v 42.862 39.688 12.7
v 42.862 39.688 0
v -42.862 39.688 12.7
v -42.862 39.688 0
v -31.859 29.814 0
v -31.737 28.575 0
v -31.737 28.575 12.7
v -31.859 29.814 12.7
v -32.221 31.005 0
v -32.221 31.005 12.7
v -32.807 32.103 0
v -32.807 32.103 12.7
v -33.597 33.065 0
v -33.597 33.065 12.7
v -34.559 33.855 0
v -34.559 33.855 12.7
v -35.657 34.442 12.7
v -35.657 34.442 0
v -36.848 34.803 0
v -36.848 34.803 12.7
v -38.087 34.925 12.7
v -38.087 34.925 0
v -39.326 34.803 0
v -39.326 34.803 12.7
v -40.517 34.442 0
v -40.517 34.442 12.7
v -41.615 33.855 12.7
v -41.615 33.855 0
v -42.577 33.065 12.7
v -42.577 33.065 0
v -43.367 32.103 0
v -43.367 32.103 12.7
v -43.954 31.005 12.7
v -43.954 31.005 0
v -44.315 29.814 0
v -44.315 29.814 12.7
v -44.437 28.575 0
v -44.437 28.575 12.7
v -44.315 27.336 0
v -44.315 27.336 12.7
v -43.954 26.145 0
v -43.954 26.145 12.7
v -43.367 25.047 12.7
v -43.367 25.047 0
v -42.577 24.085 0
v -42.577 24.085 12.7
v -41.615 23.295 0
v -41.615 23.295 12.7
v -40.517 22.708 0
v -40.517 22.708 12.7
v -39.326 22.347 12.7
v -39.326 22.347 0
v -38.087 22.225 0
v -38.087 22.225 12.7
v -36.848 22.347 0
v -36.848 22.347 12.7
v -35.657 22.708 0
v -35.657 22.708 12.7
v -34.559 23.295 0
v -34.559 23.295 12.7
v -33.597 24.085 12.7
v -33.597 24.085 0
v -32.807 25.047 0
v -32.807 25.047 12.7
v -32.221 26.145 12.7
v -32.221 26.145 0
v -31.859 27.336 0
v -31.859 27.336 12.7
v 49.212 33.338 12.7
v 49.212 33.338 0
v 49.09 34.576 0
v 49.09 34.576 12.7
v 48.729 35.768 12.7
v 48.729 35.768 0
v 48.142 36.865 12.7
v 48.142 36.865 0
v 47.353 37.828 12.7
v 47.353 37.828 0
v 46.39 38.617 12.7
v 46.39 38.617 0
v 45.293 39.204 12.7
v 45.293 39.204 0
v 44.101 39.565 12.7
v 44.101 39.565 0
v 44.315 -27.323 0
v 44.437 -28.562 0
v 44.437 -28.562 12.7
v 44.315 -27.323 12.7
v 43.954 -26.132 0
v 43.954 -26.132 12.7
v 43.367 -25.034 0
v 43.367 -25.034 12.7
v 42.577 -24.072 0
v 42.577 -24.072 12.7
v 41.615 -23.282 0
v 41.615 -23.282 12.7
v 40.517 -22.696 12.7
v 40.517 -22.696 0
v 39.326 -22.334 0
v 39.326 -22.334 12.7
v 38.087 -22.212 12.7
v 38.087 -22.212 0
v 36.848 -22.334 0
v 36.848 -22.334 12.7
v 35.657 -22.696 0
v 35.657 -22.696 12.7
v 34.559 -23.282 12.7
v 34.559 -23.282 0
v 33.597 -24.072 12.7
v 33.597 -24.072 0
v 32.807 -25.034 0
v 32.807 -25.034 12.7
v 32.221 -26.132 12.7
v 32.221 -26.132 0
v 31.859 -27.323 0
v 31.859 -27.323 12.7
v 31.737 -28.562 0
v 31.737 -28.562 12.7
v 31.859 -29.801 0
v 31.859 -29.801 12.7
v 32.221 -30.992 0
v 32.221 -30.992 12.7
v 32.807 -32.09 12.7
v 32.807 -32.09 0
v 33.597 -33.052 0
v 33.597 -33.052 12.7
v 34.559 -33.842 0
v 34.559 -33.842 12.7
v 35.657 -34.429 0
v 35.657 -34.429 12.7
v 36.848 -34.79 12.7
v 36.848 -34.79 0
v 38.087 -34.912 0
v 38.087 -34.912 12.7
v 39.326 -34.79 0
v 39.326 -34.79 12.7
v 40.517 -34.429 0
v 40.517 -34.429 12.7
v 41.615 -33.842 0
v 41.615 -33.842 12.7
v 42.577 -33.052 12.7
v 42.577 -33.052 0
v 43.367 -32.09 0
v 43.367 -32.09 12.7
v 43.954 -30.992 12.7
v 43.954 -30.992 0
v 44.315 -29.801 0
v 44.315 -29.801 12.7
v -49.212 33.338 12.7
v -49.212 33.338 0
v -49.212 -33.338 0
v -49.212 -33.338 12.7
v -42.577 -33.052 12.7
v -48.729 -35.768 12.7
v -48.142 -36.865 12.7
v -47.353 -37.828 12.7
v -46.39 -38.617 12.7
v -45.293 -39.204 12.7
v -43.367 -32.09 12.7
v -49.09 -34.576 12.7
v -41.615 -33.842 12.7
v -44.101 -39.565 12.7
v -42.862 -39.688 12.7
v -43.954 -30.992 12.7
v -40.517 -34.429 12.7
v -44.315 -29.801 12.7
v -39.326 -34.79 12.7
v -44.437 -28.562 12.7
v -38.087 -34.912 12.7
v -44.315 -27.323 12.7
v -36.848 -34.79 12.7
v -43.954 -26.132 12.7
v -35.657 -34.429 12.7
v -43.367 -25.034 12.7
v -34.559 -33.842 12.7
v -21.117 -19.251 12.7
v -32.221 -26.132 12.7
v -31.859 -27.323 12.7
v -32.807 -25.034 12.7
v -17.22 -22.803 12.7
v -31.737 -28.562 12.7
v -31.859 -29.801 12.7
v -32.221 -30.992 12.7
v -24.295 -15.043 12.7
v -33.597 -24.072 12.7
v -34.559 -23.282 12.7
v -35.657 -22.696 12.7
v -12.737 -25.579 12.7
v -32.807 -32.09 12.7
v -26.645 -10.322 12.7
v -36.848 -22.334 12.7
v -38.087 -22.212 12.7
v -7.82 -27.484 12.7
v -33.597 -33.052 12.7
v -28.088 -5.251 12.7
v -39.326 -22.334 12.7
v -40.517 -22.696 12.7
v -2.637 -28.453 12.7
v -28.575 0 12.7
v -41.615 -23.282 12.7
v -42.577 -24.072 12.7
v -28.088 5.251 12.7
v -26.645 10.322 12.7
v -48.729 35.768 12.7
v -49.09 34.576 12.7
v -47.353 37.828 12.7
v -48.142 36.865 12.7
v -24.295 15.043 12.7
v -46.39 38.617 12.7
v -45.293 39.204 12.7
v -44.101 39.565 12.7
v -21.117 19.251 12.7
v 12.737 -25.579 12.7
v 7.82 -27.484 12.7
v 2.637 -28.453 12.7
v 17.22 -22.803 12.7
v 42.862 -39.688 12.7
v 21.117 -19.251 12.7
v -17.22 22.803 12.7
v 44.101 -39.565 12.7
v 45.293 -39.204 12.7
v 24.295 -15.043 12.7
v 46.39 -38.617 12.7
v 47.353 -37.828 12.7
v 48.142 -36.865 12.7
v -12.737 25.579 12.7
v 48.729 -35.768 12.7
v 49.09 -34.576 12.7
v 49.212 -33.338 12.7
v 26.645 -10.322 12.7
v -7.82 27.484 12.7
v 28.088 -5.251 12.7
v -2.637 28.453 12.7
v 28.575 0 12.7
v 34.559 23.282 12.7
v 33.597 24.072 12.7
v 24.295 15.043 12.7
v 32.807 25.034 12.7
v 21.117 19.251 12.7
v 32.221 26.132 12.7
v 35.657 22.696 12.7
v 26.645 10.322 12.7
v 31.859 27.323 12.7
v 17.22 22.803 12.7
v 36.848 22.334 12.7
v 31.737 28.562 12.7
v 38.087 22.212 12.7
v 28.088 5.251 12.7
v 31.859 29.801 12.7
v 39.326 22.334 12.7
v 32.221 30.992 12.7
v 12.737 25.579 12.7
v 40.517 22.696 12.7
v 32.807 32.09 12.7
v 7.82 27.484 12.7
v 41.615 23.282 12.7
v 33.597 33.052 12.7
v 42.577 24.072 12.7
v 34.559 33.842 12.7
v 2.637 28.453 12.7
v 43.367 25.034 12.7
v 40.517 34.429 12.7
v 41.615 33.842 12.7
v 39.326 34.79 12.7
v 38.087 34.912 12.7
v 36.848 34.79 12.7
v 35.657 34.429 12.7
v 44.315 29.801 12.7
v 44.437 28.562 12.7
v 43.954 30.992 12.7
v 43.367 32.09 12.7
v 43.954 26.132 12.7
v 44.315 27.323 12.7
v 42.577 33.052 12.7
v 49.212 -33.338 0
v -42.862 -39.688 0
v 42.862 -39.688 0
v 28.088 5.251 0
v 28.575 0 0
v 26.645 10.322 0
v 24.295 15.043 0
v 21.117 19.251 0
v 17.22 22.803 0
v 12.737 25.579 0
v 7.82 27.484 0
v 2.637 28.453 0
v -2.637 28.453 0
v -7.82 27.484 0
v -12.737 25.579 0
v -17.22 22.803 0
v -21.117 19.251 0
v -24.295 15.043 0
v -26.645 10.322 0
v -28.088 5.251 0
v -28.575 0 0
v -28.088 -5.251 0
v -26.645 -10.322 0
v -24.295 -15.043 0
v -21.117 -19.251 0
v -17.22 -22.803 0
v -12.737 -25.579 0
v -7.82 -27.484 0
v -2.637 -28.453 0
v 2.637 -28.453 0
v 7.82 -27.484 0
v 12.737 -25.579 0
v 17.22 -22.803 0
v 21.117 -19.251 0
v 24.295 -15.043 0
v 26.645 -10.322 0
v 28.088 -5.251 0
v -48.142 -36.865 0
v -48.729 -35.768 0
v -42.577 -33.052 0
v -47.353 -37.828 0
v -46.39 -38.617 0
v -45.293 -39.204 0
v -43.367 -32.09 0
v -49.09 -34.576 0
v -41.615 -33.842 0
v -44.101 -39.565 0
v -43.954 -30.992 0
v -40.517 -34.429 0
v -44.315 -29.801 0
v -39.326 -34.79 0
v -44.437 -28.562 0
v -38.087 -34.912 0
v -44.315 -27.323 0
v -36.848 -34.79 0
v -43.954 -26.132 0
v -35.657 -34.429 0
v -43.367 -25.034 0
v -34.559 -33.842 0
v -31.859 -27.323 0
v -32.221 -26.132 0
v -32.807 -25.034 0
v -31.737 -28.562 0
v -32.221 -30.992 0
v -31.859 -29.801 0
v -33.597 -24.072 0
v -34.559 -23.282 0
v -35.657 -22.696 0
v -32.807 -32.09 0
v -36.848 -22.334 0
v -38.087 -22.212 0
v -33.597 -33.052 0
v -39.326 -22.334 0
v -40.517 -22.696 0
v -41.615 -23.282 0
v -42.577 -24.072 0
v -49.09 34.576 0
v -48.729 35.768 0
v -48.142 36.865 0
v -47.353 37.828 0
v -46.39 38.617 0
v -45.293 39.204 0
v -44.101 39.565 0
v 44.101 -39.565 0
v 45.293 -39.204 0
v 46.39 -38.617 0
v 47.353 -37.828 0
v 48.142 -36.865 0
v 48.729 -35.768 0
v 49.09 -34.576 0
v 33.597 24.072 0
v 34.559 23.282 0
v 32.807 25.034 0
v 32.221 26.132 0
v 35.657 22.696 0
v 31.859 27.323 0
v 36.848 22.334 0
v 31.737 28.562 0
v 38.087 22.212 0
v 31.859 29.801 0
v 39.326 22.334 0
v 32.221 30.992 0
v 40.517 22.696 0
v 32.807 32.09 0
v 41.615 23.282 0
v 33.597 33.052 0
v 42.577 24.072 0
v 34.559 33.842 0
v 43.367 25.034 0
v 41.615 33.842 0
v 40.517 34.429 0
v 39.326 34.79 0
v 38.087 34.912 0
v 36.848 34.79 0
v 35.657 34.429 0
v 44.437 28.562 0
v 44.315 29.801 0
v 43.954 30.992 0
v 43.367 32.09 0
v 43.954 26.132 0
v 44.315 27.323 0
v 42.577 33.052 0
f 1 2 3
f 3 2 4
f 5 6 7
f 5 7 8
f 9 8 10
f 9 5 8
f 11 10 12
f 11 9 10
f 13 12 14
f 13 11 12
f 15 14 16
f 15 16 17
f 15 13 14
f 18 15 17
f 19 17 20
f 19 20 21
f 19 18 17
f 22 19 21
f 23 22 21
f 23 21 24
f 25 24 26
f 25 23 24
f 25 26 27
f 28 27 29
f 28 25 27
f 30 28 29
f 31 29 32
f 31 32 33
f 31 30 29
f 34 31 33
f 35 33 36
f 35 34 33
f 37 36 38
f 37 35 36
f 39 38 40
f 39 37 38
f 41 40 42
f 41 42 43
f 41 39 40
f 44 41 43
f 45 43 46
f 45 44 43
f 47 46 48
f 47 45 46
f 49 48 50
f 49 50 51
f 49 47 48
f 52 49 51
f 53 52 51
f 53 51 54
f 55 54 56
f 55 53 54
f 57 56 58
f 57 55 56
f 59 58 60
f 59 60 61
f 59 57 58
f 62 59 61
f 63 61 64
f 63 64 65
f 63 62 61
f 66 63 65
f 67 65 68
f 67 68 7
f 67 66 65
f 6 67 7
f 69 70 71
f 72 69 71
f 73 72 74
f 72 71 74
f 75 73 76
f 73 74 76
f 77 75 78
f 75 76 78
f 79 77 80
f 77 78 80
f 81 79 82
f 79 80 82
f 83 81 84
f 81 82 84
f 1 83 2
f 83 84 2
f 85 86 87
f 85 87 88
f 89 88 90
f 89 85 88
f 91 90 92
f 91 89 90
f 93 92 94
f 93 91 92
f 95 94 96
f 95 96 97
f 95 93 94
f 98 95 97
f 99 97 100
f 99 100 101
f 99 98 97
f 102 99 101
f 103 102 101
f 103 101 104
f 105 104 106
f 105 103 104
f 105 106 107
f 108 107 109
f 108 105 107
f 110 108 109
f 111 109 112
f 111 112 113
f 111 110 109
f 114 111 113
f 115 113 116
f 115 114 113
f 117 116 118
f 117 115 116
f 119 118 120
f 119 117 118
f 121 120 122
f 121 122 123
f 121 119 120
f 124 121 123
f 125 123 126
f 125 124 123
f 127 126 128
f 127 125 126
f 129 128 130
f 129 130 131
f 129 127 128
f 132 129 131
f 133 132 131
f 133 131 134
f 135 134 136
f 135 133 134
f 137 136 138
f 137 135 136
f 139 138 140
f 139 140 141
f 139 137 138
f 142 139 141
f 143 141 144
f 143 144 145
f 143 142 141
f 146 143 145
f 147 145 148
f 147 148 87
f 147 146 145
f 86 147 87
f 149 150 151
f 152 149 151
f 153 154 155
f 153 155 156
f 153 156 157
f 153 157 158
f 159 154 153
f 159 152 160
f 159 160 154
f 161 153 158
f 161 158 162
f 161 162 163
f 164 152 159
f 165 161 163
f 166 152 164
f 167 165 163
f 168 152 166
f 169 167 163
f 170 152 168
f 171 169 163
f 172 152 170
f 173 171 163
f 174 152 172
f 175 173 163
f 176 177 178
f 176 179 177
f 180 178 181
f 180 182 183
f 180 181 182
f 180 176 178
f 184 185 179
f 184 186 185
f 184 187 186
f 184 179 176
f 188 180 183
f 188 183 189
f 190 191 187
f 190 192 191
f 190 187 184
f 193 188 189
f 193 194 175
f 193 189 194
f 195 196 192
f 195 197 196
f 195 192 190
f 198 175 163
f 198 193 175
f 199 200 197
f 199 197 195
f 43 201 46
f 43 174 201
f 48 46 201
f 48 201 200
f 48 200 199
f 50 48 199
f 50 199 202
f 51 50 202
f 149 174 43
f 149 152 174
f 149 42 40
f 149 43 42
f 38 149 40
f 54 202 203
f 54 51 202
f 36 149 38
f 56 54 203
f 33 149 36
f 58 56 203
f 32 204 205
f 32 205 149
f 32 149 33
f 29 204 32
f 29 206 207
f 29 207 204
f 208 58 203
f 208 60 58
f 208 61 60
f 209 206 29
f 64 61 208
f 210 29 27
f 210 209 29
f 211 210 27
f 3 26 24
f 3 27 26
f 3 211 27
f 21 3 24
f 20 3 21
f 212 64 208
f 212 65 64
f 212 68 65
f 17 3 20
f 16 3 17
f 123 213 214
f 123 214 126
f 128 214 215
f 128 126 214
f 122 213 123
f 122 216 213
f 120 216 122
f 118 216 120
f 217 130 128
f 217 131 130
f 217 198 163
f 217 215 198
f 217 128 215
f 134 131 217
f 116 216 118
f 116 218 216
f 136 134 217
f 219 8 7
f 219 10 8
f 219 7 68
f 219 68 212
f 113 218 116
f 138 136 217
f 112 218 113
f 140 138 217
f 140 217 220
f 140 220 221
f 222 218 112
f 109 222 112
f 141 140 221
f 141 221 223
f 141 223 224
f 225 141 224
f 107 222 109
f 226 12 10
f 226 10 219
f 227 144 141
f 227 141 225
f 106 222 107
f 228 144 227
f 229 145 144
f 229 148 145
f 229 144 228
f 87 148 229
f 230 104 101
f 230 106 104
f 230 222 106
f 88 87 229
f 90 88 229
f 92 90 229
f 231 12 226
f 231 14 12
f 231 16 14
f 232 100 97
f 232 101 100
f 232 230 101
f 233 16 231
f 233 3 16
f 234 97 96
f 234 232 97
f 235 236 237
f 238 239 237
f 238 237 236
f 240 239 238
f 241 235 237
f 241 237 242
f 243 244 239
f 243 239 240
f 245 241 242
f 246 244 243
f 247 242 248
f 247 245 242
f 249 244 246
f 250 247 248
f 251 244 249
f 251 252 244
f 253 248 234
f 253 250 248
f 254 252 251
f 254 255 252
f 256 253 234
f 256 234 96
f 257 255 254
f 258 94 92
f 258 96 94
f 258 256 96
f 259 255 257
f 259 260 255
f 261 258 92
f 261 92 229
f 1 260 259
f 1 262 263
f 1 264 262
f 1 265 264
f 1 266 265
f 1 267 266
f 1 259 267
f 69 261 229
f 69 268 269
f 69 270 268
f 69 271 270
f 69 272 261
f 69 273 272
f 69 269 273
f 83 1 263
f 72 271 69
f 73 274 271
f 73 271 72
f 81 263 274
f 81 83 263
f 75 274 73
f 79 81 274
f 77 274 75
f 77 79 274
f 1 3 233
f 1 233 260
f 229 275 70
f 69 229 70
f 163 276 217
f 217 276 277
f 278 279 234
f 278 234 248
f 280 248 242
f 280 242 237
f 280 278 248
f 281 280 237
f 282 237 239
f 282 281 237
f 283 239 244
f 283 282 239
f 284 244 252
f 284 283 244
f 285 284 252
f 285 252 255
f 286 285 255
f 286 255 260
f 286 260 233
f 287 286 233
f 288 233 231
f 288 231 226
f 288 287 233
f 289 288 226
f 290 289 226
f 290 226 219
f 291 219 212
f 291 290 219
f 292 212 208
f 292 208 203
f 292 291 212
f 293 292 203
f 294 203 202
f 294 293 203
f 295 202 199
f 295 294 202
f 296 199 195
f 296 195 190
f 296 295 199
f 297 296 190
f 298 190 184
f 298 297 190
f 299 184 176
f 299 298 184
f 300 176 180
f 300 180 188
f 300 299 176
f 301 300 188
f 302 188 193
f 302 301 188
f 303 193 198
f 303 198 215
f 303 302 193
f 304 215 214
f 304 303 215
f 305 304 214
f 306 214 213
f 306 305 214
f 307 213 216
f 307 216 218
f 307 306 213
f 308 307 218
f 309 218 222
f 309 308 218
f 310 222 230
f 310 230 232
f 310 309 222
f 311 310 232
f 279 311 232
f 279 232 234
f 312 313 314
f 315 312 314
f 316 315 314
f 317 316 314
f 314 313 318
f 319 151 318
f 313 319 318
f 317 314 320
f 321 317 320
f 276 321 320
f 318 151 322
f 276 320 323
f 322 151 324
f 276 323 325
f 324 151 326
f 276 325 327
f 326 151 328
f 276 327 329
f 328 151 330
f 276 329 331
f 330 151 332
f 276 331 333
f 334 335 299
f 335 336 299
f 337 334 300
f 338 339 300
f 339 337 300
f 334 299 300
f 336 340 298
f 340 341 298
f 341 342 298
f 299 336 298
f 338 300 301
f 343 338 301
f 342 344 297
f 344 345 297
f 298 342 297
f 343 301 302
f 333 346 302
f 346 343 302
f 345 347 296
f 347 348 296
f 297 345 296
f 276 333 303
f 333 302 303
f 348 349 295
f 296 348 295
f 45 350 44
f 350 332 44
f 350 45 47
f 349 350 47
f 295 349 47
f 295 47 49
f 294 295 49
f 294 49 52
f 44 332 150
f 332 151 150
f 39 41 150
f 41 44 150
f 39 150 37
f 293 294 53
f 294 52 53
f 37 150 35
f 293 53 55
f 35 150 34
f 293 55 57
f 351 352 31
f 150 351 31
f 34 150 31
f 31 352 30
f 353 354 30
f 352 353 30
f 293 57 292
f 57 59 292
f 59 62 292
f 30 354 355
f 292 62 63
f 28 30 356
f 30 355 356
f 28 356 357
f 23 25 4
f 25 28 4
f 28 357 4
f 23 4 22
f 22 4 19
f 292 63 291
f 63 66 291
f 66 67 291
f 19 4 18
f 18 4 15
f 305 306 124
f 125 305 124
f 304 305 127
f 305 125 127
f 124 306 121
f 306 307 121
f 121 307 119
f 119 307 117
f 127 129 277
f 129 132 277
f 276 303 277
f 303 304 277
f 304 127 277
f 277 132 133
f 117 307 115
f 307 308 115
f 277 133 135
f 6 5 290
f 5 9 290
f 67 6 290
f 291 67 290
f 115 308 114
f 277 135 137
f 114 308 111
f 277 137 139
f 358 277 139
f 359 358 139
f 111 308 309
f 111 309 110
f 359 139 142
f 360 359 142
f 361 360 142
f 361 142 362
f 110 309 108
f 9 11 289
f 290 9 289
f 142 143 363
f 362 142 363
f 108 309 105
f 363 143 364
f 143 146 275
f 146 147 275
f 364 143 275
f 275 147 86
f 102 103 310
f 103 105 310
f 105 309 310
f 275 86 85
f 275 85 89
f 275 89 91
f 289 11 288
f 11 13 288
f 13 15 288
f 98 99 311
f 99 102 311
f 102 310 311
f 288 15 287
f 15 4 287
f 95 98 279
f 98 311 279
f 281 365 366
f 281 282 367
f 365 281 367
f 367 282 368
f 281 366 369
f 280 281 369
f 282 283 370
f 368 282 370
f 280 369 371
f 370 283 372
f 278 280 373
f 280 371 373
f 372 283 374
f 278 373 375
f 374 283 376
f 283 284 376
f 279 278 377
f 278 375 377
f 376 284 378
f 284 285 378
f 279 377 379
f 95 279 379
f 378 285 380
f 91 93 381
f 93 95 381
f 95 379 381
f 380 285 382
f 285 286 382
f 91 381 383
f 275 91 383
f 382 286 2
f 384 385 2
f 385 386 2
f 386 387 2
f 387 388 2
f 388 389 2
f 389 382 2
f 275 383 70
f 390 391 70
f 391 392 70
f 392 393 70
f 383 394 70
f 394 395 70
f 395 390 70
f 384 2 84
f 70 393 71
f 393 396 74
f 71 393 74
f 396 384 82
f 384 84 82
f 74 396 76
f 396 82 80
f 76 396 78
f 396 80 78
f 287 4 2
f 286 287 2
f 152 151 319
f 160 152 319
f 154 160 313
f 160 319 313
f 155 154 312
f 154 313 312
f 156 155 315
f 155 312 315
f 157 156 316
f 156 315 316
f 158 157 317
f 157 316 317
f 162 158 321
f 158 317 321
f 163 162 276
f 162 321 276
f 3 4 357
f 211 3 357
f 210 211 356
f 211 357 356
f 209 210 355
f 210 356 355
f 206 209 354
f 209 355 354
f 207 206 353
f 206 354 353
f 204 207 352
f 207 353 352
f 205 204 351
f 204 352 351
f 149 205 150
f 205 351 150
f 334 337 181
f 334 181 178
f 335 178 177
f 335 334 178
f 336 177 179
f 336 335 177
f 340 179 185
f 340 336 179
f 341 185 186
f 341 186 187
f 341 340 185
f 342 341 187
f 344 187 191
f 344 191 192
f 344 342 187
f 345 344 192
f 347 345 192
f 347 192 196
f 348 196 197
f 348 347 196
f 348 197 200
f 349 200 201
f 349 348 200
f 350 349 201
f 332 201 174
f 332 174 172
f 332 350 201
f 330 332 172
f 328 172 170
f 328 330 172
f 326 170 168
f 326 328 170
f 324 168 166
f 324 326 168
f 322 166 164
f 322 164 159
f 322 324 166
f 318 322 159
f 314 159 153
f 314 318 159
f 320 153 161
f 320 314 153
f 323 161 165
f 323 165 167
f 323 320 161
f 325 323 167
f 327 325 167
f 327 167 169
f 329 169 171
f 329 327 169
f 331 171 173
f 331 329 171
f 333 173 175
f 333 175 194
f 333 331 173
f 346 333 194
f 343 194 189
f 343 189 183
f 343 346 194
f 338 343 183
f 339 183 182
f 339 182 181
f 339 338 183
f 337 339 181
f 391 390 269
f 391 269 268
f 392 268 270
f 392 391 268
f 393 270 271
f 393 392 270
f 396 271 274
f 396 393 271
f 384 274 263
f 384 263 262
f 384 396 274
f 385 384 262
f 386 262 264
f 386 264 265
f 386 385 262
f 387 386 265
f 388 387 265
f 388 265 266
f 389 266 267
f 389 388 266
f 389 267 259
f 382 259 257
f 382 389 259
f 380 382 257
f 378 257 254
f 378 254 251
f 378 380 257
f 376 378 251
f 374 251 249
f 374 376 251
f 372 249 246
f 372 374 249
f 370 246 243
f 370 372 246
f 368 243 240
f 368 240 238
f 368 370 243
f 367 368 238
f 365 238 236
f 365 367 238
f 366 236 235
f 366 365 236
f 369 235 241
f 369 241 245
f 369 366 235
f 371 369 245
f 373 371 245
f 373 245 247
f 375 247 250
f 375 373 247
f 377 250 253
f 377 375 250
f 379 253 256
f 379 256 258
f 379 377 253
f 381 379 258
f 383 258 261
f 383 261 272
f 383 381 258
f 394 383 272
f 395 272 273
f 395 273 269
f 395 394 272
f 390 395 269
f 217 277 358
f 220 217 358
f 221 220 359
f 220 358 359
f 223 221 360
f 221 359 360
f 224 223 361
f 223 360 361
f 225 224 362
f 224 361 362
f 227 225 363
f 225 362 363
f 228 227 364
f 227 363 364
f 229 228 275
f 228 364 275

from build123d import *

# Parameters (mm, degrees)
F0_R     = 6.35
F0_R_2   = 28.575
F1_DEPTH = 12.7


with BuildPart() as f1:
    # F0 (on Top) → F1 (new body)
    with BuildSketch(Plane.XY):
        with BuildLine():
            ThreePointArc((49.2125, 33.3375), (47.352628, 37.827628), (42.8625, 39.6875))
            Line((42.8625, 39.6875), (-42.8625, 39.6875))
            ThreePointArc((-42.8625, 39.6875), (-47.352628, 37.827628), (-49.2125, 33.3375))
            Line((-49.2125, 33.3375), (-49.2125, -33.3375))
            ThreePointArc((-49.2125, -33.3375), (-47.352628, -37.827628), (-42.8625, -39.6875))
            Line((-42.8625, -39.6875), (42.8625, -39.6875))
            ThreePointArc((42.8625, -39.6875), (47.352628, -37.827628), (49.2125, -33.3375))
            Line((49.2125, -33.3375), (49.2125, 33.3375))
        make_face()
        with Locations((-38.0873, -28.5623)):
            Circle(F0_R, mode=Mode.SUBTRACT)
        with Locations((38.0873, -28.5623)):
            Circle(F0_R, mode=Mode.SUBTRACT)
        with Locations((-38.0873, 28.575)):
            Circle(F0_R, mode=Mode.SUBTRACT)
        Circle(F0_R_2, mode=Mode.SUBTRACT)
        with Locations((38.0873, 28.5623)):
            Circle(F0_R, mode=Mode.SUBTRACT)
    extrude(amount=F1_DEPTH)


solid = f1.part
